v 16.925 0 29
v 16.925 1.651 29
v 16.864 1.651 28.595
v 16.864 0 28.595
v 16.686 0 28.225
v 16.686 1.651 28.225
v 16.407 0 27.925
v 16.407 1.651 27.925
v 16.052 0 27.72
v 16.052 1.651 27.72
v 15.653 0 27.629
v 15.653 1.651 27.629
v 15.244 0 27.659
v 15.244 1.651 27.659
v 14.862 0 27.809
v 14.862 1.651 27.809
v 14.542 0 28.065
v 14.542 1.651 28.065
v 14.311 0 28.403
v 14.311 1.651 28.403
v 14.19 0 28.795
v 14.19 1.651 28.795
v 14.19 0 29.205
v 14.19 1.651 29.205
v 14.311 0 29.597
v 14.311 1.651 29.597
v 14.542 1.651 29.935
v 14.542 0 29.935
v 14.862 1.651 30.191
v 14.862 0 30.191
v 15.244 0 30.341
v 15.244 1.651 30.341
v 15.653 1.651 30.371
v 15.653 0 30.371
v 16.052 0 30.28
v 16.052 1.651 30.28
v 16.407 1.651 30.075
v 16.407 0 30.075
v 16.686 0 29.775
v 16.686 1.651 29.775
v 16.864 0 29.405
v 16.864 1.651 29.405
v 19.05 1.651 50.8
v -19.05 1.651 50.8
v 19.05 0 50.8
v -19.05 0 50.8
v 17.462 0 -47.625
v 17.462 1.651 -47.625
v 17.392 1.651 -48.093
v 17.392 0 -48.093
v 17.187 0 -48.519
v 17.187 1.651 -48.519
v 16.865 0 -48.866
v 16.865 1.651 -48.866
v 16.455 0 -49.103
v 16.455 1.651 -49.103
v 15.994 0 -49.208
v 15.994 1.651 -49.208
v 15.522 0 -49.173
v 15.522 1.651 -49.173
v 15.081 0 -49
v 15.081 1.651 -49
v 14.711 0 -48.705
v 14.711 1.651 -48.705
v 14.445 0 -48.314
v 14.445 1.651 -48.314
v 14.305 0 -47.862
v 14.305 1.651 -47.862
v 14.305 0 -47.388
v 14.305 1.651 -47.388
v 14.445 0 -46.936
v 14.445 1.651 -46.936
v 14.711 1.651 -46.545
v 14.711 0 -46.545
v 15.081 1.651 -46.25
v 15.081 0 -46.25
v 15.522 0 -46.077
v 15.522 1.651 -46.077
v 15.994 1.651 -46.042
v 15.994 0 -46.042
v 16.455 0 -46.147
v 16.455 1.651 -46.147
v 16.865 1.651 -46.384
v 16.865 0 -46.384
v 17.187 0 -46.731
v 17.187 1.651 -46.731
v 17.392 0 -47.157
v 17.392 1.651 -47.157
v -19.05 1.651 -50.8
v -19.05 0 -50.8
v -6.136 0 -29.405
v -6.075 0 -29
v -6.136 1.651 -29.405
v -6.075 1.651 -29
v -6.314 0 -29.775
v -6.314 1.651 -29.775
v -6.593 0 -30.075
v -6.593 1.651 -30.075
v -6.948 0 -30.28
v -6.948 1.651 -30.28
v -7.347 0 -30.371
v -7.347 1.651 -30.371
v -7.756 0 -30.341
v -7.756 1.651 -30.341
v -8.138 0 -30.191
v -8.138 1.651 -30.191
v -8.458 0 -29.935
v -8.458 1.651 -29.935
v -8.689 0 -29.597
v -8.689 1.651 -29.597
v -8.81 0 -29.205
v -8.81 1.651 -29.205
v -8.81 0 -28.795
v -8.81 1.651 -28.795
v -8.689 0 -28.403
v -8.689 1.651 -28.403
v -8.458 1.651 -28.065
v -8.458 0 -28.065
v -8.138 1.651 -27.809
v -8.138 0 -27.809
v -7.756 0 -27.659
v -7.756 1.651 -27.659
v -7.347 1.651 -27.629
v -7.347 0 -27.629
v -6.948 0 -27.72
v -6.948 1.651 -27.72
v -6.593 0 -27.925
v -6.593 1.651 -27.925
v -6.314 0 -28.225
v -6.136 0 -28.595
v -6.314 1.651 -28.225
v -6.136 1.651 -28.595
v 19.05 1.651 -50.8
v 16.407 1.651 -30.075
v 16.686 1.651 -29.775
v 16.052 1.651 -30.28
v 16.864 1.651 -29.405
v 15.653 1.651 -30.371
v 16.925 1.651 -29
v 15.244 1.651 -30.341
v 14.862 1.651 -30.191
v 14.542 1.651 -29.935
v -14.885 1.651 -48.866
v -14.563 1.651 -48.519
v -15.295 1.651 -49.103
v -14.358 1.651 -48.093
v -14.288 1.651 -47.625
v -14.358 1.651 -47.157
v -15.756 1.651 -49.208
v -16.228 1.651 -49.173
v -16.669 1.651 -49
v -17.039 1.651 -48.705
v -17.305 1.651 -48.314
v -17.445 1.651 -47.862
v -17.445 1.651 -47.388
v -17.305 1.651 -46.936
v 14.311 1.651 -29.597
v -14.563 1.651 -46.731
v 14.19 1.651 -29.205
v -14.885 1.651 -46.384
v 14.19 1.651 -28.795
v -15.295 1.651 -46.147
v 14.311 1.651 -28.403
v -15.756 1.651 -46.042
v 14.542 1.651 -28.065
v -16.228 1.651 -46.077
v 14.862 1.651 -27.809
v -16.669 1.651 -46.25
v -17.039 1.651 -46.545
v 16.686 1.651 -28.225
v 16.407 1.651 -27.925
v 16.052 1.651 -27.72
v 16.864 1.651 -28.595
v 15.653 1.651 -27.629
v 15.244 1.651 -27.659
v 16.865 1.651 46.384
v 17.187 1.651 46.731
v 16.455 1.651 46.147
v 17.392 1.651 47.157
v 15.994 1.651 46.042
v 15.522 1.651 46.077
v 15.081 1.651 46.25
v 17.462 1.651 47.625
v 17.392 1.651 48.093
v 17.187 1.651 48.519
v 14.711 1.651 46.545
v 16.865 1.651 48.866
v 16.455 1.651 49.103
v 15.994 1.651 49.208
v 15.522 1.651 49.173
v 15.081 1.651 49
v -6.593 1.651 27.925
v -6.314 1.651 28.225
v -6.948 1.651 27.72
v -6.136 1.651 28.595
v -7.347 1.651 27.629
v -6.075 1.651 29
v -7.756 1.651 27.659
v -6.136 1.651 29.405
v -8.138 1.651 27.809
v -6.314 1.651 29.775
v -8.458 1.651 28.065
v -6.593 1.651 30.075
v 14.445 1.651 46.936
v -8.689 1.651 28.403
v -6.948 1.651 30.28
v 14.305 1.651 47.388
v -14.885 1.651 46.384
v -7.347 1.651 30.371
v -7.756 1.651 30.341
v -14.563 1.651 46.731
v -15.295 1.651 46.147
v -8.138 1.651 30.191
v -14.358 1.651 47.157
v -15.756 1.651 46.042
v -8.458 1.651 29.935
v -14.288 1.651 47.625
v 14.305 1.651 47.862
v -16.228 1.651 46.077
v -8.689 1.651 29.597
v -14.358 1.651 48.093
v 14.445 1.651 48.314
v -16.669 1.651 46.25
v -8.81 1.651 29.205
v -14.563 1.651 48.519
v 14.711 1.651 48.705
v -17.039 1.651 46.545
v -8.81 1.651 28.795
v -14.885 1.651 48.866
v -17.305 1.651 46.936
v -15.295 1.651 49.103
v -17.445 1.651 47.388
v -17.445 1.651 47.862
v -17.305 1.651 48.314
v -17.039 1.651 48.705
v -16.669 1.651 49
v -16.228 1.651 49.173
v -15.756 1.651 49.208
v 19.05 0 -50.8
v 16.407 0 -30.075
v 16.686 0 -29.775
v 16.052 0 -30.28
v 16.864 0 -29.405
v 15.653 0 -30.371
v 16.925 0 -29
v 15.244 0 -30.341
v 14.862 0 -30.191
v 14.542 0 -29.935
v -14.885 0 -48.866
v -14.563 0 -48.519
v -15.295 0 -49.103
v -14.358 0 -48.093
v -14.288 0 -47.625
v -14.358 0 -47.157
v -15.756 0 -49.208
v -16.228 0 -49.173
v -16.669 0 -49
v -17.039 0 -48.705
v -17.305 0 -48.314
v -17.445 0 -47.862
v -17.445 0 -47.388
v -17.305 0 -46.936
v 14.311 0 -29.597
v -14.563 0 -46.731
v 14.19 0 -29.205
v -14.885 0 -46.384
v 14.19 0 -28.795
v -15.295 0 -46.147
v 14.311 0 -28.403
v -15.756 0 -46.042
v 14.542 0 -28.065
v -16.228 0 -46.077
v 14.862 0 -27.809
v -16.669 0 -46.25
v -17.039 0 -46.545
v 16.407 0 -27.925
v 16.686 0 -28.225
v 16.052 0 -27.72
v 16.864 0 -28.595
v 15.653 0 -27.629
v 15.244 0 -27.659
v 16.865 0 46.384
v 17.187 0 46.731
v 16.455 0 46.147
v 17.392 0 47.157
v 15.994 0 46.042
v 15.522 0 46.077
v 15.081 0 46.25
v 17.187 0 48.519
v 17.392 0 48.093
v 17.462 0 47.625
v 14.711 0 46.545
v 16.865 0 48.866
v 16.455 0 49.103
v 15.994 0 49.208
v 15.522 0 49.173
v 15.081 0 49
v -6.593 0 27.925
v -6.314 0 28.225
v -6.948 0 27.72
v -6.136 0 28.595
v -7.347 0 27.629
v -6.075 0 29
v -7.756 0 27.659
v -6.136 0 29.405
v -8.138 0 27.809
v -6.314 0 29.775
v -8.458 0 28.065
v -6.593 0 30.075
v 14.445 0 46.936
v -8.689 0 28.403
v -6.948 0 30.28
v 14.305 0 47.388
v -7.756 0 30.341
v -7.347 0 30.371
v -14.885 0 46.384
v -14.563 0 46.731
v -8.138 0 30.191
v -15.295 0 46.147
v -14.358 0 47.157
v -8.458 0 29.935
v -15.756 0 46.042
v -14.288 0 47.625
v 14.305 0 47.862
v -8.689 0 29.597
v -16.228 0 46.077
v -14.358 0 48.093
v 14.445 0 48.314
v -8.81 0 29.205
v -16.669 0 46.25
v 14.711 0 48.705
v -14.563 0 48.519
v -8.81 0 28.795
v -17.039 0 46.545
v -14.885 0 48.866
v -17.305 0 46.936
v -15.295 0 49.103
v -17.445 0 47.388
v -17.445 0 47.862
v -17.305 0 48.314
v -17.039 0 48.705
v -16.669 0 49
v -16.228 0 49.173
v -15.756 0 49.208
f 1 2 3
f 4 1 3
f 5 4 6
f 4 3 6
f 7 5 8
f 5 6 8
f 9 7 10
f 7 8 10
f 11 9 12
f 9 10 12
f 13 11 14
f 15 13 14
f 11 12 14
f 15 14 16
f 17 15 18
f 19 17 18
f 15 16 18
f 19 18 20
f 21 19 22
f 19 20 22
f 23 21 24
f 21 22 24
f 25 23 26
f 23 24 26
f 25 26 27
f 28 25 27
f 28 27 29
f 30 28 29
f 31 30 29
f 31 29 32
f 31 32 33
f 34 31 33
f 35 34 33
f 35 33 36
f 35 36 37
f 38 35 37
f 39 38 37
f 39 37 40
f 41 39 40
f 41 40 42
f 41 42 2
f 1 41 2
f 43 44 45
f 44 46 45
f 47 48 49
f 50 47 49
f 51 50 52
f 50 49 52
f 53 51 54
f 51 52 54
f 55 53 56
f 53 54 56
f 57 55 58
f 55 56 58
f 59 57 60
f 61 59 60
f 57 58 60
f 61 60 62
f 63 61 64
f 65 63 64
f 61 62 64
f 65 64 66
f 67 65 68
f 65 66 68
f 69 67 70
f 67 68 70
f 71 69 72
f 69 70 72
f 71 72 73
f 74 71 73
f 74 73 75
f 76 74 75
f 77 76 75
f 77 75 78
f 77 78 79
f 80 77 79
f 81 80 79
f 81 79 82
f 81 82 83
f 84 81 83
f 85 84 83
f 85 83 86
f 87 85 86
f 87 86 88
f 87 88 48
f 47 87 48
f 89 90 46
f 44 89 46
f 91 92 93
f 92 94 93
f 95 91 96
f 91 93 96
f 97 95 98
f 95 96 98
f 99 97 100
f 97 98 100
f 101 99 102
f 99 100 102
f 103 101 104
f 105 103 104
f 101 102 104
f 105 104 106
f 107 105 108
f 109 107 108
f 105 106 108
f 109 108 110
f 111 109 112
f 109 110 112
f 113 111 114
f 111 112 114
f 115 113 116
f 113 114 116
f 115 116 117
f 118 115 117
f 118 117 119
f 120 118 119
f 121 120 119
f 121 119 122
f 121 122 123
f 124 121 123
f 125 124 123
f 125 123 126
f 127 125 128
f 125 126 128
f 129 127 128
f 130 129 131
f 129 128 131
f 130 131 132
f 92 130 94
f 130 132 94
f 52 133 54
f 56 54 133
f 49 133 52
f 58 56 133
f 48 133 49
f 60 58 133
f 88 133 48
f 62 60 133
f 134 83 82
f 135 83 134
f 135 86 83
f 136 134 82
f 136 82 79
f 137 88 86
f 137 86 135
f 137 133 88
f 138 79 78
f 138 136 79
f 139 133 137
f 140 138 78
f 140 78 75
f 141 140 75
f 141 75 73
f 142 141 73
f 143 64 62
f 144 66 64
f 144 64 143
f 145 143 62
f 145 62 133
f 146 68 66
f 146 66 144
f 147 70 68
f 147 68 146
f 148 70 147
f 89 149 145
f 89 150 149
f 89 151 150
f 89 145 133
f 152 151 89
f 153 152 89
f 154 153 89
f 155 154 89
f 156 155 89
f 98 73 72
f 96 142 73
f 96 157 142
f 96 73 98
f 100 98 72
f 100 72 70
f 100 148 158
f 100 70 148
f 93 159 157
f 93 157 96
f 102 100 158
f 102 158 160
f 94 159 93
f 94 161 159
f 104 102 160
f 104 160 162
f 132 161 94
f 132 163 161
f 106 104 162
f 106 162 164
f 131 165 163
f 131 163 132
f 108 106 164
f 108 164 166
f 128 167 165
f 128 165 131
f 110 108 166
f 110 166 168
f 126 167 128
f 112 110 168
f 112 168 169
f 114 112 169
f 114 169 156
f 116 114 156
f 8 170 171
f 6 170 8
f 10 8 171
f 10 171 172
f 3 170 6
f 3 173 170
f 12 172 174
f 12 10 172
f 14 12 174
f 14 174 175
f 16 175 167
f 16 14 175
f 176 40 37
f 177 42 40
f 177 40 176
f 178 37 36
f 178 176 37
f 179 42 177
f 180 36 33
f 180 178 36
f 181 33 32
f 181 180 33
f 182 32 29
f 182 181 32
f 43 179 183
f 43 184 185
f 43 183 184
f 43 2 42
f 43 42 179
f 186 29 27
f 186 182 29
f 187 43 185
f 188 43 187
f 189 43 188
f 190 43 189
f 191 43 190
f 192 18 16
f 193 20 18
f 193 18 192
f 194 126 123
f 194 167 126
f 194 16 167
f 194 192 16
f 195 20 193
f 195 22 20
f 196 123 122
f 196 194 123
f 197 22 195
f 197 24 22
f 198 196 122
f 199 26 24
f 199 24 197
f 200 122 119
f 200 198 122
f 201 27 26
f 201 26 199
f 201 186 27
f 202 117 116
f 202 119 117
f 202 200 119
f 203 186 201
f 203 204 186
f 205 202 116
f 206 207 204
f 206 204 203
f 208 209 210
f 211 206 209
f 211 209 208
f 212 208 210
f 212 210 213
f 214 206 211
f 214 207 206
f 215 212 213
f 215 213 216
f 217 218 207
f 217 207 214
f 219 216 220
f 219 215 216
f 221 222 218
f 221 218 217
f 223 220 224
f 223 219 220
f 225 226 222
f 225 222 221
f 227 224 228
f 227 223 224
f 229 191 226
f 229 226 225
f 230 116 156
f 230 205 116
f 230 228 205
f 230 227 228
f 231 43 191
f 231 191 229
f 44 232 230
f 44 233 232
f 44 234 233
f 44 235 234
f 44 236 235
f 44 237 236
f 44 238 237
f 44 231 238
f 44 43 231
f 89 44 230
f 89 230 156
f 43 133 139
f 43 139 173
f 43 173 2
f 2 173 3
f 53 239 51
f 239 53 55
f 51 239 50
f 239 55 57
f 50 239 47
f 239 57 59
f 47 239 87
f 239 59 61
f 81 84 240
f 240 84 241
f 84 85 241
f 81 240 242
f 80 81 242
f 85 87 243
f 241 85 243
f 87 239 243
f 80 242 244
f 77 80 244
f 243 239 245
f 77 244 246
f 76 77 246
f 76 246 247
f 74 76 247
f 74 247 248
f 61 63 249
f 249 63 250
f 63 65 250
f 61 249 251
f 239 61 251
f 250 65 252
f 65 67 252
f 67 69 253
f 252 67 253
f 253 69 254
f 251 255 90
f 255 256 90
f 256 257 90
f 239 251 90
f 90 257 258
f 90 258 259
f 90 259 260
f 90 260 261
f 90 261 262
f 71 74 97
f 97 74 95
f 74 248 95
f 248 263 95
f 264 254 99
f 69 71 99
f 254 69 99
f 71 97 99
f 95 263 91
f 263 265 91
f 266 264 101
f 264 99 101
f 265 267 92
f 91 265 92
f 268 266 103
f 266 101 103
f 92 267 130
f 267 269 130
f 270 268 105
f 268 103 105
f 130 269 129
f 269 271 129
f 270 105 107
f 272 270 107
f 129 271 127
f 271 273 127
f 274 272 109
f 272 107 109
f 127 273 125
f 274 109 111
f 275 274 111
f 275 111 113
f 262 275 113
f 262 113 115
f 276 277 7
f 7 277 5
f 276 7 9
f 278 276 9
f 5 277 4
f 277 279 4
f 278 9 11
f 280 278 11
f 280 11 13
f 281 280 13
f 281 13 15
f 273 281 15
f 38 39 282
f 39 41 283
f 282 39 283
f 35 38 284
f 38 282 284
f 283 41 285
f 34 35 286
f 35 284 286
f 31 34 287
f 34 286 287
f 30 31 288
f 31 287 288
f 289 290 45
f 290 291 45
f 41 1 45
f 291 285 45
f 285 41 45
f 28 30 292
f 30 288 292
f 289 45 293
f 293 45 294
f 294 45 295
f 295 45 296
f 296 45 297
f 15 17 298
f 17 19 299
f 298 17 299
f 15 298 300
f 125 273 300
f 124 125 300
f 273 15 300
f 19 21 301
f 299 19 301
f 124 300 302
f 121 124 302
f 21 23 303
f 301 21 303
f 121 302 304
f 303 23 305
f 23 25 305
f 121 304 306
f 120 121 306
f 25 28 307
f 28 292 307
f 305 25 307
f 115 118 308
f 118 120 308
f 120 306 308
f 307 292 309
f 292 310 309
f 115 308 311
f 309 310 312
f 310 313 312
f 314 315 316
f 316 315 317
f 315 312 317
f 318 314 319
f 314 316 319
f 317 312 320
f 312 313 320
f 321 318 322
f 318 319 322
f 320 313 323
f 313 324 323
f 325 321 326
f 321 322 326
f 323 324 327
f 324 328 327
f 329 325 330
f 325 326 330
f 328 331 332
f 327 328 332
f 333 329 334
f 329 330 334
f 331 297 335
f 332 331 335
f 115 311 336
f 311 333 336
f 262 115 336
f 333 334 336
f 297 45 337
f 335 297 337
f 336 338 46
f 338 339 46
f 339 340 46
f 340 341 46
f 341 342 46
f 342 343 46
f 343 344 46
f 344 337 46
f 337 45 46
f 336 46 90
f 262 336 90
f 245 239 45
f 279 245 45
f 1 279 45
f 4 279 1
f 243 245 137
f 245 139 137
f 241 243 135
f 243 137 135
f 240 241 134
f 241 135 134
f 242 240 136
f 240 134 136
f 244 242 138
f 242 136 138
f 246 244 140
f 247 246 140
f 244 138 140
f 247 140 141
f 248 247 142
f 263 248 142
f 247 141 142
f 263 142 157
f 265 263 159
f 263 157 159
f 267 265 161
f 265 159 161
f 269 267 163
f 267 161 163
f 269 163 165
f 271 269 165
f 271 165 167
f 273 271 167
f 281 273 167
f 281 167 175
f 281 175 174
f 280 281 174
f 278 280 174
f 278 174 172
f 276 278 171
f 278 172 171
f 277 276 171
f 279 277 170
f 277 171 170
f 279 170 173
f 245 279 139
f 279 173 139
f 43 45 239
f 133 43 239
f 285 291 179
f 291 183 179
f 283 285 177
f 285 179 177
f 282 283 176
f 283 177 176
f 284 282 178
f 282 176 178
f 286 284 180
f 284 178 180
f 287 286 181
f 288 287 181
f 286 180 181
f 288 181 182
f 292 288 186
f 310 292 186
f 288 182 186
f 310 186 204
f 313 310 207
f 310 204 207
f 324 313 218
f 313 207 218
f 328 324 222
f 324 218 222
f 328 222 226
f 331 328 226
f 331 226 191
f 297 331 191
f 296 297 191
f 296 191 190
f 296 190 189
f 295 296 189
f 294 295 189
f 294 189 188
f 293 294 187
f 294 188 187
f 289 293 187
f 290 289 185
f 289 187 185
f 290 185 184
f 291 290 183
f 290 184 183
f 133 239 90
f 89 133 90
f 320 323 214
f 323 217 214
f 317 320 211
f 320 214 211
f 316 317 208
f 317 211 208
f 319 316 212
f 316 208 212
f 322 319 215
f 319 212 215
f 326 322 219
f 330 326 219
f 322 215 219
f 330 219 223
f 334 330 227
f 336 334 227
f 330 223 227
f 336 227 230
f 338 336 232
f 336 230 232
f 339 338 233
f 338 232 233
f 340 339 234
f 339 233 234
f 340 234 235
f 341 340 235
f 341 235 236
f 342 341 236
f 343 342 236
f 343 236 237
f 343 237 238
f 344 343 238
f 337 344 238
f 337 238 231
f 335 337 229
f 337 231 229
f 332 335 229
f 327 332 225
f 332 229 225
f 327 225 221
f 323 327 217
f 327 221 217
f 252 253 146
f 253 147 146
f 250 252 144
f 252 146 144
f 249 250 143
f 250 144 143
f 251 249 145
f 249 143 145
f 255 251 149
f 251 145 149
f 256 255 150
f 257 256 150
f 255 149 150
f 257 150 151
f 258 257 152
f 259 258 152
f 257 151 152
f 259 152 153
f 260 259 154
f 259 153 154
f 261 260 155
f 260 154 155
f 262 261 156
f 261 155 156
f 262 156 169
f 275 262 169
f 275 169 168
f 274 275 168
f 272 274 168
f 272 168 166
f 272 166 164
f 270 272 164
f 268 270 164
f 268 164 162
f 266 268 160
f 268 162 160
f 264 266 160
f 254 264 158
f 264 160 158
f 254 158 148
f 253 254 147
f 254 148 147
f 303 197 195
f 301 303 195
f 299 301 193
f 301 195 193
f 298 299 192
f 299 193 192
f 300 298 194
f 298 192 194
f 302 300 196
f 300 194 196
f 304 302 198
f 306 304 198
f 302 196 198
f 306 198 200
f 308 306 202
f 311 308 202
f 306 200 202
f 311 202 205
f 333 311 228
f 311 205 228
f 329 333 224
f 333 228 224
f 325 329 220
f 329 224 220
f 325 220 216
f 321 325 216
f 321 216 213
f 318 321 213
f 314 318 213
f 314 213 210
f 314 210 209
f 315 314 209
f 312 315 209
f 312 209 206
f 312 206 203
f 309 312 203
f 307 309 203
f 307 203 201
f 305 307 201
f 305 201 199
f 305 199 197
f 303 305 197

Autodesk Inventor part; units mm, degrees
ref_plane "YZ Plane" through (0, 0, 0) normal (1, 0, 0) x (0, 1, 0)
ref_plane "XZ Plane" through (0, 0, 0) normal (0, 1, 0) x (-1, 0, 0)
ref_plane "XY Plane" through (0, 0, 0) normal (0, 0, 1) x (1, 0, 0)
sketch "Sketch1" plane through (0, 0, 0) normal (0, 1, 0) x (-1, 0, 0)
  line L0 (19.05, 50.8) -> (6.35, 50.8)
  line L1 (6.35, -50.8) -> (19.05, -50.8)
  line L2 (19.05, -50.8) -> (19.05, 50.8)
  line L3 (6.35, 50.8) -> (-19.05, 50.8)
  line L4 (-19.05, 50.8) -> (-19.05, -50.8)
  line L5 (-19.05, -50.8) -> (6.35, -50.8)
  line L6 (6.35, -50.8) -> (6.35, -50.8)
  line L7 (6.35, 50.8) -> (6.35, 50.8)
  point P0 (0, 0)
  dimension "d0" = 101.6
  dimension "d2" = 101.6
  dimension "d3" = 0
  dimension "d4" = 12.7
  dimension "d5" = 25.4
  dimension "d6" = 0
  dimension "d7" = 50.8
  dimension "d8" = 38.1
  dimension "d9" = 19.05
  dimension "d10" = 12.7
extrude "Extrusion1" add sketch "Sketch1" along normal blind 1.651
sketch "Sketch2" plane through (0, 1.651, 0) normal (0, 1, 0) x (1, 0, 0)
  circle A0 centre (-15.875, -47.625) radius 1.5875
  circle A1 centre (15.875, -47.625) radius 1.5875
  circle A2 centre (-15.875, 47.625) radius 1.5875
  circle A3 centre (15.875, 47.625) radius 1.5875
  line L0 (19.05, 50.8) -> (-19.05, 50.8) projected
  line L1 (-19.05, 50.8) -> (-19.05, -50.8) projected
  line L2 (19.05, -50.8) -> (19.05, 50.8) projected
  line L3 (-19.05, -50.8) -> (19.05, -50.8) projected
  point P0 (0, 0)
  point P1 (-6.35, 38.1)
  dimension "d13" = 3.175
  dimension "d14" = 3.175
  dimension "d15" = 3.175
  dimension "d16" = 3.175
  dimension "d17" = 3.175
  dimension "d18" = 3.175
  dimension "d19" = 3.175
  dimension "d20" = 3.175
  dimension "d21" = 3.175
  dimension "d22" = 3.175
  dimension "d23" = 3.175
  dimension "d27" = 3.175
extrude "Extrusion2" cut sketch "Sketch2" against normal through all contours A0 | A1 | A2 | A3
sketch "Sketch3" plane through (0, 1.651, 0) normal (0, 1, 0) x (1, 0, 0)
  circle A0 centre (-7.45, 29) radius 1.375
  circle A1 centre (15.55, 29) radius 1.375
  circle A2 centre (-7.45, -29) radius 1.375
  circle A3 centre (15.55, -29) radius 1.375
  line L0 (-19.05, -50.8) -> (19.05, -50.8) projected
  line L1 (19.05, 50.8) -> (-19.05, 50.8) projected
  line L2 (-19.05, 50.8) -> (-19.05, -50.8) projected
  line L3 (19.05, -50.8) -> (19.05, 50.8) projected
  point P0 (0, 0)
  dimension "d28" = 2.75
  dimension "d29" = 2.75
  dimension "d30" = 2.75
  dimension "d31" = 2.75
  dimension "d32" = 23
  dimension "d33" = 23
  dimension "d34" = 58
  dimension "d35" = 101.6
  dimension "d36" = 29
  dimension "d39" = 0
  dimension "d40" = 0
  dimension "d41" = 58
  dimension "d44" = 3.5
extrude "Extrusion3" cut sketch "Sketch3" against normal through all contours A0 | A1 | A2 | A3
equation "\"d0\" = d2"
equation "\"d6\" = d3"
equation "\"d7\" = 0.5 * d2"
equation "\"d9\" = 0.5 * d8"
equation "\"d10\" = d4"
equation "\"d14\" = d13"
equation "\"d15\" = d13"
equation "\"d16\" = d13"
equation "\"d19\" = d18"
equation "\"d20\" = d17"
equation "\"d21\" = d19"
equation "\"d22\" = d17"
equation "\"d23\" = d17"
equation "\"d27\" = d21"
equation "\"d29\" = d28"
equation "\"d30\" = d28"
equation "\"d31\" = d28"
equation "\"d32\" = d33"
equation "\"d36\" = 0.5 * d34"
equation "\"d41\" = d34"
properties part number "STARduino layout"
